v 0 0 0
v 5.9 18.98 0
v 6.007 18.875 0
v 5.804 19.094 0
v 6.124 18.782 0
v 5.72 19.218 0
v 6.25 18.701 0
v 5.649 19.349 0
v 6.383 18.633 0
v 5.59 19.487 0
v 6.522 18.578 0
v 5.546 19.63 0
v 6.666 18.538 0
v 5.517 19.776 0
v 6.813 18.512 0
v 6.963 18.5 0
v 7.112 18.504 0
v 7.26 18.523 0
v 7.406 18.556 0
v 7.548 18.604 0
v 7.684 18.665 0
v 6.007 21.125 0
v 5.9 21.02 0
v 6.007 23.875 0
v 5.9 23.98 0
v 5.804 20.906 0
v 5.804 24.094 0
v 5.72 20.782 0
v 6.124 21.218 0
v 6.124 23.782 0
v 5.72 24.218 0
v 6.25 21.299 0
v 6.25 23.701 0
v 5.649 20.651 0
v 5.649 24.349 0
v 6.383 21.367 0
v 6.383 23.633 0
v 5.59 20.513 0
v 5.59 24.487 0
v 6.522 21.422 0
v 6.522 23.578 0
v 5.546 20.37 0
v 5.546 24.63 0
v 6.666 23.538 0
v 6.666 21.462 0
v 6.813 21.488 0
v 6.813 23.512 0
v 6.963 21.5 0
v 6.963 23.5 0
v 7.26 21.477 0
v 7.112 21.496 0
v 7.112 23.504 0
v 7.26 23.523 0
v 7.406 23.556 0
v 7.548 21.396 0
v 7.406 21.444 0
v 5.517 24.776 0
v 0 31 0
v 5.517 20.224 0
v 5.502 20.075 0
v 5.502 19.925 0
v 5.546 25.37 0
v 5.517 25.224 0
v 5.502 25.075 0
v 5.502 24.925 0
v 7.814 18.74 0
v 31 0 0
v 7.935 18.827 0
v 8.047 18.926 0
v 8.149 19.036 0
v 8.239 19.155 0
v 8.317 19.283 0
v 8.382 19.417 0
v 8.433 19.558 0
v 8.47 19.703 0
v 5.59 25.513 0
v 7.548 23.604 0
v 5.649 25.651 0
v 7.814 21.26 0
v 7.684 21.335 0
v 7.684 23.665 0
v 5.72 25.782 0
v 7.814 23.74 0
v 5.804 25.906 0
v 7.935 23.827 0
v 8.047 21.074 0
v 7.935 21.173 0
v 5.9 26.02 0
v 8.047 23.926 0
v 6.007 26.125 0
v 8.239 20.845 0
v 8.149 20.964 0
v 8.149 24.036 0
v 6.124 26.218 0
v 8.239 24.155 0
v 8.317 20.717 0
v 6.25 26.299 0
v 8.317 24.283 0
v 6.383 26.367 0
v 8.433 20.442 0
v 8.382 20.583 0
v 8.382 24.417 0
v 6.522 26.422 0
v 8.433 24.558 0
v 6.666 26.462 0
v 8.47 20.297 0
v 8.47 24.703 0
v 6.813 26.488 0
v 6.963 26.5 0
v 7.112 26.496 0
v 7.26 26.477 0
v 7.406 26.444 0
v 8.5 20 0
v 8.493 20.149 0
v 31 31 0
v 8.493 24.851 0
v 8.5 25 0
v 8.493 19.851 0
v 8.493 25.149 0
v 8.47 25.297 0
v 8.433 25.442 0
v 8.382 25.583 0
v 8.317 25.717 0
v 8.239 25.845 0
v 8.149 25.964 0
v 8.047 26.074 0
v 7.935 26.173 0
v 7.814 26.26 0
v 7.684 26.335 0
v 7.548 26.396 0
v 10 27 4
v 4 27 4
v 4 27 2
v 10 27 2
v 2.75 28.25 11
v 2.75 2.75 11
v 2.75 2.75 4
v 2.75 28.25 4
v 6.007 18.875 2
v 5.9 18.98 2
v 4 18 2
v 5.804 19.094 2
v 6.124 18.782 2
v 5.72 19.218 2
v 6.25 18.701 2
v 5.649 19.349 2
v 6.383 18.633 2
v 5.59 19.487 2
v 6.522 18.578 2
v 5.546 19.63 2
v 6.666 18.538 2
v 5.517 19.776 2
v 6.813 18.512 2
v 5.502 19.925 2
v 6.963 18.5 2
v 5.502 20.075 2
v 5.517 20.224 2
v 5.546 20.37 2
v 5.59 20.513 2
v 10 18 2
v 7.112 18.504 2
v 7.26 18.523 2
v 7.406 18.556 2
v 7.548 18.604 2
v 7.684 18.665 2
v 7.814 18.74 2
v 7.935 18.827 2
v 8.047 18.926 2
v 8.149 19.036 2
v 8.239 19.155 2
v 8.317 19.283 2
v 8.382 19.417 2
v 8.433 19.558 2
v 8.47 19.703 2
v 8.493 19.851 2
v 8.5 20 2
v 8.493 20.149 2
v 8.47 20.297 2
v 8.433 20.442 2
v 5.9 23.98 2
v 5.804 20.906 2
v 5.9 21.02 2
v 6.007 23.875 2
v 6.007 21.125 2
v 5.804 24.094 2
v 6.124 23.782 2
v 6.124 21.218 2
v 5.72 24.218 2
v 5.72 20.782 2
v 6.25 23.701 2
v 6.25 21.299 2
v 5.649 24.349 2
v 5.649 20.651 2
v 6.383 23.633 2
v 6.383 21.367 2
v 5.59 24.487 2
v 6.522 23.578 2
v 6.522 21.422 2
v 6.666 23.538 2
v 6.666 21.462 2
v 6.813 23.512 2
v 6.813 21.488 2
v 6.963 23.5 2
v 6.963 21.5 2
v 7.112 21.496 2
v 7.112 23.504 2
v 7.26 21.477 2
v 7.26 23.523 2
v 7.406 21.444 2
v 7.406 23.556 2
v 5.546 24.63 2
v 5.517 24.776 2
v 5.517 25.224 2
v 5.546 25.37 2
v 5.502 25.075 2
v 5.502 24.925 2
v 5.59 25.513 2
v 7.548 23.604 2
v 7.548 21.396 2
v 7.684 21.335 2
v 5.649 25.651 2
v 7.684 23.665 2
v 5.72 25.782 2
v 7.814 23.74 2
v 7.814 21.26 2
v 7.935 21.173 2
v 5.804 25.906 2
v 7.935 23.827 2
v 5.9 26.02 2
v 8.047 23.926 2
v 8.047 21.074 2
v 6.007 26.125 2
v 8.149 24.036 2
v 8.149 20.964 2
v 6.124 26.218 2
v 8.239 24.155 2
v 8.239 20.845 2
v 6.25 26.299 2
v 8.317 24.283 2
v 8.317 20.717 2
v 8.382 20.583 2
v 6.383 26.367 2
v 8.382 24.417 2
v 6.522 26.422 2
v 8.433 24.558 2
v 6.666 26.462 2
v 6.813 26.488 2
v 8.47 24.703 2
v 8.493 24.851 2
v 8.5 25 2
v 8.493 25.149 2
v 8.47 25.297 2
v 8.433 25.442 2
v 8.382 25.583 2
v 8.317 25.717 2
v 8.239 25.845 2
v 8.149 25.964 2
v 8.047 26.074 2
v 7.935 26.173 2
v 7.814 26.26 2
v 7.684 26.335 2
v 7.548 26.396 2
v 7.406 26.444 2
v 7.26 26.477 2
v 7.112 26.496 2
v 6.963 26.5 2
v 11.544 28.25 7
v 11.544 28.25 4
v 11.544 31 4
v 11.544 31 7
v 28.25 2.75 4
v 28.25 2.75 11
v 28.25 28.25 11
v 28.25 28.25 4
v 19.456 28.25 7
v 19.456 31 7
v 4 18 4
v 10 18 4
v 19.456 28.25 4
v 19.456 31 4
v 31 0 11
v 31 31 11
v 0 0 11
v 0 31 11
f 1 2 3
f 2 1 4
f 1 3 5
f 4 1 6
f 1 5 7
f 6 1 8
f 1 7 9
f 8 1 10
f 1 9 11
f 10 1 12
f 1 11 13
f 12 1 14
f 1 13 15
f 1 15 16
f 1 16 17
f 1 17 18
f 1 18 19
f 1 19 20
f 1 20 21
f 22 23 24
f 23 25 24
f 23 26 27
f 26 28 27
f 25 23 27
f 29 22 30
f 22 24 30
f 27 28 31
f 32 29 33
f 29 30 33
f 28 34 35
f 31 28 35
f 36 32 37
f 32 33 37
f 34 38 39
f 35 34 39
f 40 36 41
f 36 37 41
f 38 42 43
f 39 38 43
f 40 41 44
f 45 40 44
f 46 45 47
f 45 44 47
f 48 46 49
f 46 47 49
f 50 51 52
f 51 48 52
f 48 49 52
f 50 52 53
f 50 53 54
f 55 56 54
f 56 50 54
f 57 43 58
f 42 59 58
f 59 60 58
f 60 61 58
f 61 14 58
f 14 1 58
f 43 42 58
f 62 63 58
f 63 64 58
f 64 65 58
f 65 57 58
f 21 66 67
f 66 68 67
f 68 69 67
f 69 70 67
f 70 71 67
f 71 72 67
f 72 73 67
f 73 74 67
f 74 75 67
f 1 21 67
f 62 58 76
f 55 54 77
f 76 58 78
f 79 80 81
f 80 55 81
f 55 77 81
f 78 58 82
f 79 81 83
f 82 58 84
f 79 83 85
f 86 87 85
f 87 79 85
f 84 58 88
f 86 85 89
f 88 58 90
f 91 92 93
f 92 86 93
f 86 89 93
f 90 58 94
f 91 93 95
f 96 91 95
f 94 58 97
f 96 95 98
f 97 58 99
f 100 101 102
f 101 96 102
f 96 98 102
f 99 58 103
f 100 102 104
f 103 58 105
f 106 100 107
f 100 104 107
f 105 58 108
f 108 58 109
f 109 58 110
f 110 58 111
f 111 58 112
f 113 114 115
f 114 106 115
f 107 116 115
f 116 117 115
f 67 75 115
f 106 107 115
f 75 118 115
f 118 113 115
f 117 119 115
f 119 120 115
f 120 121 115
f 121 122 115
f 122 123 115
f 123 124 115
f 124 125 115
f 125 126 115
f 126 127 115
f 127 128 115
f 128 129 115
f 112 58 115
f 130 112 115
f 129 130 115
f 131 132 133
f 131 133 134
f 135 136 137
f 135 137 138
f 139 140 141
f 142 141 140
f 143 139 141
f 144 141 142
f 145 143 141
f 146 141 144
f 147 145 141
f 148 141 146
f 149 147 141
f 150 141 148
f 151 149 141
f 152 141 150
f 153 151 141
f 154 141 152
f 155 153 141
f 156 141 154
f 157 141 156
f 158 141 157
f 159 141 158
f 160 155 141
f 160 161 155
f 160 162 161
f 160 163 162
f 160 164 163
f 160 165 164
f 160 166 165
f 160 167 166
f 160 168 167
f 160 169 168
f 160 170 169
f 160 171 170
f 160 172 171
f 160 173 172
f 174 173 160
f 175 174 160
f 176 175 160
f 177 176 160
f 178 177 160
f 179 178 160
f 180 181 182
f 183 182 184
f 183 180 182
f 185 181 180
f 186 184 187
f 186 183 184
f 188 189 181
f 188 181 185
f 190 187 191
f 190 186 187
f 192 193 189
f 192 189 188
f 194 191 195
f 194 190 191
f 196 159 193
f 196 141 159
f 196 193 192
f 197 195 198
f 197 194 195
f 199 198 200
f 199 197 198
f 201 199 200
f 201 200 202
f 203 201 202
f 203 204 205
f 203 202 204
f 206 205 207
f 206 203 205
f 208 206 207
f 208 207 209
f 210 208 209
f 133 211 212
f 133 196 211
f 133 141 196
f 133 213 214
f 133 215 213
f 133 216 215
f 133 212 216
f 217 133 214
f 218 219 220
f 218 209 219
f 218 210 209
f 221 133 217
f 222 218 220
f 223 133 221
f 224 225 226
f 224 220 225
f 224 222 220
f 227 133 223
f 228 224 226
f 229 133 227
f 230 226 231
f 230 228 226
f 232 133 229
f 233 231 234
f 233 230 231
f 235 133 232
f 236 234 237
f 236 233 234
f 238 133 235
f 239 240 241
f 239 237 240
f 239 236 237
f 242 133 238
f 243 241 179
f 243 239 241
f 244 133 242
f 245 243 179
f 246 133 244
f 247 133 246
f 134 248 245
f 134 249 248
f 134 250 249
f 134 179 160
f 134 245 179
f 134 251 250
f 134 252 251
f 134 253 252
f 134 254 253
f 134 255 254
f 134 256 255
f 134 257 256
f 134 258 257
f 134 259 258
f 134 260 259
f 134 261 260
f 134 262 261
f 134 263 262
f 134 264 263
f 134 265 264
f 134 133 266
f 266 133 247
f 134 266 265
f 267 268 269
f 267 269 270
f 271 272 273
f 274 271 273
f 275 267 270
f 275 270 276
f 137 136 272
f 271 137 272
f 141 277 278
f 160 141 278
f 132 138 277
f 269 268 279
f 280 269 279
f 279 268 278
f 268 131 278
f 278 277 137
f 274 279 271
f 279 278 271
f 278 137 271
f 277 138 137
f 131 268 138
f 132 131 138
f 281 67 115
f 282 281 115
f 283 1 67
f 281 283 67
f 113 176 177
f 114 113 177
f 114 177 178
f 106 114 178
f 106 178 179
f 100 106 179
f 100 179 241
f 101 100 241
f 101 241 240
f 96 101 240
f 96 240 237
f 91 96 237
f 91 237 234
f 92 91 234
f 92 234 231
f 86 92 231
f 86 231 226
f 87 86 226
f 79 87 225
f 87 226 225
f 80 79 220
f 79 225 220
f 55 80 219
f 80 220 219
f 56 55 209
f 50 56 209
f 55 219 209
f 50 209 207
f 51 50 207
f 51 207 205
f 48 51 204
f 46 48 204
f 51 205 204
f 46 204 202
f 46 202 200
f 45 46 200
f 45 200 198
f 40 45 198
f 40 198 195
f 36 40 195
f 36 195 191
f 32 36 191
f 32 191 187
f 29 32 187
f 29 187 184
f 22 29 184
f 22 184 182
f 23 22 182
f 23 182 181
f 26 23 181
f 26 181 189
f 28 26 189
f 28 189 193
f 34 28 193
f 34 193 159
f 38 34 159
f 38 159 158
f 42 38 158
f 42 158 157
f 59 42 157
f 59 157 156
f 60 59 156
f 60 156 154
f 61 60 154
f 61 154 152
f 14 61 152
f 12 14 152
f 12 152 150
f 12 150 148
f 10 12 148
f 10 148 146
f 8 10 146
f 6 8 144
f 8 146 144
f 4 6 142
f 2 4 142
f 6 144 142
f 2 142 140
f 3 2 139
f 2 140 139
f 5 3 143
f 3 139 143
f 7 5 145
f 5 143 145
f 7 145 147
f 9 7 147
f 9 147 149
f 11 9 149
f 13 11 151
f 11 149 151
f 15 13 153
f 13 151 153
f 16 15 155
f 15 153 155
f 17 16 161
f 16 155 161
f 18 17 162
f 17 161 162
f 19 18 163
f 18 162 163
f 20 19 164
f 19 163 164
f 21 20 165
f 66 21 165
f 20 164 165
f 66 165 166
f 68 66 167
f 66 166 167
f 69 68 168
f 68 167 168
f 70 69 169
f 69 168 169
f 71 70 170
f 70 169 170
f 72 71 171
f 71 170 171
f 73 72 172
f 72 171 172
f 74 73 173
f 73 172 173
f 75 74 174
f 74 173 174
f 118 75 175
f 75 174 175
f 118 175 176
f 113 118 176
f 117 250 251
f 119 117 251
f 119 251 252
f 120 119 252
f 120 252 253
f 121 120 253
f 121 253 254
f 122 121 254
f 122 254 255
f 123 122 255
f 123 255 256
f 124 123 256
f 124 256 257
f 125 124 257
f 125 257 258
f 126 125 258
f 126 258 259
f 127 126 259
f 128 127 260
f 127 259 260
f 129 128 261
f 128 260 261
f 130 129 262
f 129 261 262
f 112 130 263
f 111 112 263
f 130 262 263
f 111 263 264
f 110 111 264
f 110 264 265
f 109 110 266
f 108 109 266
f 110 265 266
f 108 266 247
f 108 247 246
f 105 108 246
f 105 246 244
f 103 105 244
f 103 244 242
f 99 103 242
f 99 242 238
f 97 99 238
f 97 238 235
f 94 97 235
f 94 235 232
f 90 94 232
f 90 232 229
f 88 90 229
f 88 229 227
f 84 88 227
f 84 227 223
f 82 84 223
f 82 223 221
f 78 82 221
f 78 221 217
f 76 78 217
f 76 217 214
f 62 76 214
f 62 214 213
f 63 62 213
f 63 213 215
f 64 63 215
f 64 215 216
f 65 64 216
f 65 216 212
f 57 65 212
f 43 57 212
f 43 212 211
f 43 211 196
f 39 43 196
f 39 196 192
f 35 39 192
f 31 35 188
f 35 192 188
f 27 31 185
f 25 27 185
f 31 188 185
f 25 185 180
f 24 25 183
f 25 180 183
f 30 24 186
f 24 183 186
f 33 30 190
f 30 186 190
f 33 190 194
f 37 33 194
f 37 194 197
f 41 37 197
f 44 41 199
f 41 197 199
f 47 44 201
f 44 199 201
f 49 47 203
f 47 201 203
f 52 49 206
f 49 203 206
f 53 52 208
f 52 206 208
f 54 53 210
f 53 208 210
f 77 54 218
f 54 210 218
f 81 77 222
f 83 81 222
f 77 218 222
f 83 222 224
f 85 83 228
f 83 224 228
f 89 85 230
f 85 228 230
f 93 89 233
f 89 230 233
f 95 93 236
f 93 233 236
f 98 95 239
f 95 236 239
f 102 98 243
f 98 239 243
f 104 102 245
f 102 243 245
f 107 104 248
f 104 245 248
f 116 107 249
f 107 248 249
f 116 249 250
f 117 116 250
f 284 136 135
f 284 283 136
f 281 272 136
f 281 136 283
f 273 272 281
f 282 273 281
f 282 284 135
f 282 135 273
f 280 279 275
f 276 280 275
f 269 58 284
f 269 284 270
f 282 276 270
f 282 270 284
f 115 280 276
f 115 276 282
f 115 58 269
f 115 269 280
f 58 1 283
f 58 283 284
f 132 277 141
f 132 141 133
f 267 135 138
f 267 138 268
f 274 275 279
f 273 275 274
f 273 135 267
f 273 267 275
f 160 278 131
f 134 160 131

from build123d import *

# Parameters (mm, degrees)
SKETCH_W        = 31
SKETCH_H        = 31
PAD_DEPTH       = 11
SKETCH001_W     = 25.5
SKETCH001_H     = 25.5
POCKET_DEPTH    = 7
SKETCH002_W     = 6
SKETCH002_H     = 9
POCKET001_DEPTH = 2
SKETCH003_R     = 1.5
POCKET002_DEPTH = 5
SKETCH004_W     = 7.912528
SKETCH004_H     = 3
POCKET003_DEPTH = 5


with BuildPart() as part:
    # Sketch → Pad (new body)
    with BuildSketch(Plane.XY):
        with Locations((15.5, 15.5)):
            Rectangle(SKETCH_W, SKETCH_H)
    extrude(amount=PAD_DEPTH)

    # Sketch001 (on Face6 of Pad) → Pocket (cut)
    with BuildSketch(Plane.XY.offset(11)):
        with Locations((15.5, 15.5)):
            Rectangle(SKETCH001_W, SKETCH001_H)
    extrude(amount=-POCKET_DEPTH, mode=Mode.SUBTRACT)

    # Sketch002 (on Face11 of Pocket) → Pocket001 (cut)
    with BuildSketch(Plane.XY.offset(4)):
        with Locations((7, 22.5)):
            Rectangle(SKETCH002_W, SKETCH002_H)
    extrude(amount=-POCKET001_DEPTH, mode=Mode.SUBTRACT)

    # Sketch003 (on Face16 of Pocket001) → Pocket002 (cut)
    with BuildSketch(Plane.XY.offset(2)):
        with Locations((7, 25)):
            Circle(SKETCH003_R)
        with Locations((7, 20)):
            Circle(SKETCH003_R)
    extrude(amount=-POCKET002_DEPTH, mode=Mode.SUBTRACT)

    # Sketch004 (on Face12 of Pocket002) → Pocket003 (cut)
    with BuildSketch(Plane.XZ.offset(-28.25)):
        with Locations((15.5, 5.5)):
            Rectangle(SKETCH004_W, SKETCH004_H)
    extrude(amount=-POCKET003_DEPTH, mode=Mode.SUBTRACT)


solid = part.part
